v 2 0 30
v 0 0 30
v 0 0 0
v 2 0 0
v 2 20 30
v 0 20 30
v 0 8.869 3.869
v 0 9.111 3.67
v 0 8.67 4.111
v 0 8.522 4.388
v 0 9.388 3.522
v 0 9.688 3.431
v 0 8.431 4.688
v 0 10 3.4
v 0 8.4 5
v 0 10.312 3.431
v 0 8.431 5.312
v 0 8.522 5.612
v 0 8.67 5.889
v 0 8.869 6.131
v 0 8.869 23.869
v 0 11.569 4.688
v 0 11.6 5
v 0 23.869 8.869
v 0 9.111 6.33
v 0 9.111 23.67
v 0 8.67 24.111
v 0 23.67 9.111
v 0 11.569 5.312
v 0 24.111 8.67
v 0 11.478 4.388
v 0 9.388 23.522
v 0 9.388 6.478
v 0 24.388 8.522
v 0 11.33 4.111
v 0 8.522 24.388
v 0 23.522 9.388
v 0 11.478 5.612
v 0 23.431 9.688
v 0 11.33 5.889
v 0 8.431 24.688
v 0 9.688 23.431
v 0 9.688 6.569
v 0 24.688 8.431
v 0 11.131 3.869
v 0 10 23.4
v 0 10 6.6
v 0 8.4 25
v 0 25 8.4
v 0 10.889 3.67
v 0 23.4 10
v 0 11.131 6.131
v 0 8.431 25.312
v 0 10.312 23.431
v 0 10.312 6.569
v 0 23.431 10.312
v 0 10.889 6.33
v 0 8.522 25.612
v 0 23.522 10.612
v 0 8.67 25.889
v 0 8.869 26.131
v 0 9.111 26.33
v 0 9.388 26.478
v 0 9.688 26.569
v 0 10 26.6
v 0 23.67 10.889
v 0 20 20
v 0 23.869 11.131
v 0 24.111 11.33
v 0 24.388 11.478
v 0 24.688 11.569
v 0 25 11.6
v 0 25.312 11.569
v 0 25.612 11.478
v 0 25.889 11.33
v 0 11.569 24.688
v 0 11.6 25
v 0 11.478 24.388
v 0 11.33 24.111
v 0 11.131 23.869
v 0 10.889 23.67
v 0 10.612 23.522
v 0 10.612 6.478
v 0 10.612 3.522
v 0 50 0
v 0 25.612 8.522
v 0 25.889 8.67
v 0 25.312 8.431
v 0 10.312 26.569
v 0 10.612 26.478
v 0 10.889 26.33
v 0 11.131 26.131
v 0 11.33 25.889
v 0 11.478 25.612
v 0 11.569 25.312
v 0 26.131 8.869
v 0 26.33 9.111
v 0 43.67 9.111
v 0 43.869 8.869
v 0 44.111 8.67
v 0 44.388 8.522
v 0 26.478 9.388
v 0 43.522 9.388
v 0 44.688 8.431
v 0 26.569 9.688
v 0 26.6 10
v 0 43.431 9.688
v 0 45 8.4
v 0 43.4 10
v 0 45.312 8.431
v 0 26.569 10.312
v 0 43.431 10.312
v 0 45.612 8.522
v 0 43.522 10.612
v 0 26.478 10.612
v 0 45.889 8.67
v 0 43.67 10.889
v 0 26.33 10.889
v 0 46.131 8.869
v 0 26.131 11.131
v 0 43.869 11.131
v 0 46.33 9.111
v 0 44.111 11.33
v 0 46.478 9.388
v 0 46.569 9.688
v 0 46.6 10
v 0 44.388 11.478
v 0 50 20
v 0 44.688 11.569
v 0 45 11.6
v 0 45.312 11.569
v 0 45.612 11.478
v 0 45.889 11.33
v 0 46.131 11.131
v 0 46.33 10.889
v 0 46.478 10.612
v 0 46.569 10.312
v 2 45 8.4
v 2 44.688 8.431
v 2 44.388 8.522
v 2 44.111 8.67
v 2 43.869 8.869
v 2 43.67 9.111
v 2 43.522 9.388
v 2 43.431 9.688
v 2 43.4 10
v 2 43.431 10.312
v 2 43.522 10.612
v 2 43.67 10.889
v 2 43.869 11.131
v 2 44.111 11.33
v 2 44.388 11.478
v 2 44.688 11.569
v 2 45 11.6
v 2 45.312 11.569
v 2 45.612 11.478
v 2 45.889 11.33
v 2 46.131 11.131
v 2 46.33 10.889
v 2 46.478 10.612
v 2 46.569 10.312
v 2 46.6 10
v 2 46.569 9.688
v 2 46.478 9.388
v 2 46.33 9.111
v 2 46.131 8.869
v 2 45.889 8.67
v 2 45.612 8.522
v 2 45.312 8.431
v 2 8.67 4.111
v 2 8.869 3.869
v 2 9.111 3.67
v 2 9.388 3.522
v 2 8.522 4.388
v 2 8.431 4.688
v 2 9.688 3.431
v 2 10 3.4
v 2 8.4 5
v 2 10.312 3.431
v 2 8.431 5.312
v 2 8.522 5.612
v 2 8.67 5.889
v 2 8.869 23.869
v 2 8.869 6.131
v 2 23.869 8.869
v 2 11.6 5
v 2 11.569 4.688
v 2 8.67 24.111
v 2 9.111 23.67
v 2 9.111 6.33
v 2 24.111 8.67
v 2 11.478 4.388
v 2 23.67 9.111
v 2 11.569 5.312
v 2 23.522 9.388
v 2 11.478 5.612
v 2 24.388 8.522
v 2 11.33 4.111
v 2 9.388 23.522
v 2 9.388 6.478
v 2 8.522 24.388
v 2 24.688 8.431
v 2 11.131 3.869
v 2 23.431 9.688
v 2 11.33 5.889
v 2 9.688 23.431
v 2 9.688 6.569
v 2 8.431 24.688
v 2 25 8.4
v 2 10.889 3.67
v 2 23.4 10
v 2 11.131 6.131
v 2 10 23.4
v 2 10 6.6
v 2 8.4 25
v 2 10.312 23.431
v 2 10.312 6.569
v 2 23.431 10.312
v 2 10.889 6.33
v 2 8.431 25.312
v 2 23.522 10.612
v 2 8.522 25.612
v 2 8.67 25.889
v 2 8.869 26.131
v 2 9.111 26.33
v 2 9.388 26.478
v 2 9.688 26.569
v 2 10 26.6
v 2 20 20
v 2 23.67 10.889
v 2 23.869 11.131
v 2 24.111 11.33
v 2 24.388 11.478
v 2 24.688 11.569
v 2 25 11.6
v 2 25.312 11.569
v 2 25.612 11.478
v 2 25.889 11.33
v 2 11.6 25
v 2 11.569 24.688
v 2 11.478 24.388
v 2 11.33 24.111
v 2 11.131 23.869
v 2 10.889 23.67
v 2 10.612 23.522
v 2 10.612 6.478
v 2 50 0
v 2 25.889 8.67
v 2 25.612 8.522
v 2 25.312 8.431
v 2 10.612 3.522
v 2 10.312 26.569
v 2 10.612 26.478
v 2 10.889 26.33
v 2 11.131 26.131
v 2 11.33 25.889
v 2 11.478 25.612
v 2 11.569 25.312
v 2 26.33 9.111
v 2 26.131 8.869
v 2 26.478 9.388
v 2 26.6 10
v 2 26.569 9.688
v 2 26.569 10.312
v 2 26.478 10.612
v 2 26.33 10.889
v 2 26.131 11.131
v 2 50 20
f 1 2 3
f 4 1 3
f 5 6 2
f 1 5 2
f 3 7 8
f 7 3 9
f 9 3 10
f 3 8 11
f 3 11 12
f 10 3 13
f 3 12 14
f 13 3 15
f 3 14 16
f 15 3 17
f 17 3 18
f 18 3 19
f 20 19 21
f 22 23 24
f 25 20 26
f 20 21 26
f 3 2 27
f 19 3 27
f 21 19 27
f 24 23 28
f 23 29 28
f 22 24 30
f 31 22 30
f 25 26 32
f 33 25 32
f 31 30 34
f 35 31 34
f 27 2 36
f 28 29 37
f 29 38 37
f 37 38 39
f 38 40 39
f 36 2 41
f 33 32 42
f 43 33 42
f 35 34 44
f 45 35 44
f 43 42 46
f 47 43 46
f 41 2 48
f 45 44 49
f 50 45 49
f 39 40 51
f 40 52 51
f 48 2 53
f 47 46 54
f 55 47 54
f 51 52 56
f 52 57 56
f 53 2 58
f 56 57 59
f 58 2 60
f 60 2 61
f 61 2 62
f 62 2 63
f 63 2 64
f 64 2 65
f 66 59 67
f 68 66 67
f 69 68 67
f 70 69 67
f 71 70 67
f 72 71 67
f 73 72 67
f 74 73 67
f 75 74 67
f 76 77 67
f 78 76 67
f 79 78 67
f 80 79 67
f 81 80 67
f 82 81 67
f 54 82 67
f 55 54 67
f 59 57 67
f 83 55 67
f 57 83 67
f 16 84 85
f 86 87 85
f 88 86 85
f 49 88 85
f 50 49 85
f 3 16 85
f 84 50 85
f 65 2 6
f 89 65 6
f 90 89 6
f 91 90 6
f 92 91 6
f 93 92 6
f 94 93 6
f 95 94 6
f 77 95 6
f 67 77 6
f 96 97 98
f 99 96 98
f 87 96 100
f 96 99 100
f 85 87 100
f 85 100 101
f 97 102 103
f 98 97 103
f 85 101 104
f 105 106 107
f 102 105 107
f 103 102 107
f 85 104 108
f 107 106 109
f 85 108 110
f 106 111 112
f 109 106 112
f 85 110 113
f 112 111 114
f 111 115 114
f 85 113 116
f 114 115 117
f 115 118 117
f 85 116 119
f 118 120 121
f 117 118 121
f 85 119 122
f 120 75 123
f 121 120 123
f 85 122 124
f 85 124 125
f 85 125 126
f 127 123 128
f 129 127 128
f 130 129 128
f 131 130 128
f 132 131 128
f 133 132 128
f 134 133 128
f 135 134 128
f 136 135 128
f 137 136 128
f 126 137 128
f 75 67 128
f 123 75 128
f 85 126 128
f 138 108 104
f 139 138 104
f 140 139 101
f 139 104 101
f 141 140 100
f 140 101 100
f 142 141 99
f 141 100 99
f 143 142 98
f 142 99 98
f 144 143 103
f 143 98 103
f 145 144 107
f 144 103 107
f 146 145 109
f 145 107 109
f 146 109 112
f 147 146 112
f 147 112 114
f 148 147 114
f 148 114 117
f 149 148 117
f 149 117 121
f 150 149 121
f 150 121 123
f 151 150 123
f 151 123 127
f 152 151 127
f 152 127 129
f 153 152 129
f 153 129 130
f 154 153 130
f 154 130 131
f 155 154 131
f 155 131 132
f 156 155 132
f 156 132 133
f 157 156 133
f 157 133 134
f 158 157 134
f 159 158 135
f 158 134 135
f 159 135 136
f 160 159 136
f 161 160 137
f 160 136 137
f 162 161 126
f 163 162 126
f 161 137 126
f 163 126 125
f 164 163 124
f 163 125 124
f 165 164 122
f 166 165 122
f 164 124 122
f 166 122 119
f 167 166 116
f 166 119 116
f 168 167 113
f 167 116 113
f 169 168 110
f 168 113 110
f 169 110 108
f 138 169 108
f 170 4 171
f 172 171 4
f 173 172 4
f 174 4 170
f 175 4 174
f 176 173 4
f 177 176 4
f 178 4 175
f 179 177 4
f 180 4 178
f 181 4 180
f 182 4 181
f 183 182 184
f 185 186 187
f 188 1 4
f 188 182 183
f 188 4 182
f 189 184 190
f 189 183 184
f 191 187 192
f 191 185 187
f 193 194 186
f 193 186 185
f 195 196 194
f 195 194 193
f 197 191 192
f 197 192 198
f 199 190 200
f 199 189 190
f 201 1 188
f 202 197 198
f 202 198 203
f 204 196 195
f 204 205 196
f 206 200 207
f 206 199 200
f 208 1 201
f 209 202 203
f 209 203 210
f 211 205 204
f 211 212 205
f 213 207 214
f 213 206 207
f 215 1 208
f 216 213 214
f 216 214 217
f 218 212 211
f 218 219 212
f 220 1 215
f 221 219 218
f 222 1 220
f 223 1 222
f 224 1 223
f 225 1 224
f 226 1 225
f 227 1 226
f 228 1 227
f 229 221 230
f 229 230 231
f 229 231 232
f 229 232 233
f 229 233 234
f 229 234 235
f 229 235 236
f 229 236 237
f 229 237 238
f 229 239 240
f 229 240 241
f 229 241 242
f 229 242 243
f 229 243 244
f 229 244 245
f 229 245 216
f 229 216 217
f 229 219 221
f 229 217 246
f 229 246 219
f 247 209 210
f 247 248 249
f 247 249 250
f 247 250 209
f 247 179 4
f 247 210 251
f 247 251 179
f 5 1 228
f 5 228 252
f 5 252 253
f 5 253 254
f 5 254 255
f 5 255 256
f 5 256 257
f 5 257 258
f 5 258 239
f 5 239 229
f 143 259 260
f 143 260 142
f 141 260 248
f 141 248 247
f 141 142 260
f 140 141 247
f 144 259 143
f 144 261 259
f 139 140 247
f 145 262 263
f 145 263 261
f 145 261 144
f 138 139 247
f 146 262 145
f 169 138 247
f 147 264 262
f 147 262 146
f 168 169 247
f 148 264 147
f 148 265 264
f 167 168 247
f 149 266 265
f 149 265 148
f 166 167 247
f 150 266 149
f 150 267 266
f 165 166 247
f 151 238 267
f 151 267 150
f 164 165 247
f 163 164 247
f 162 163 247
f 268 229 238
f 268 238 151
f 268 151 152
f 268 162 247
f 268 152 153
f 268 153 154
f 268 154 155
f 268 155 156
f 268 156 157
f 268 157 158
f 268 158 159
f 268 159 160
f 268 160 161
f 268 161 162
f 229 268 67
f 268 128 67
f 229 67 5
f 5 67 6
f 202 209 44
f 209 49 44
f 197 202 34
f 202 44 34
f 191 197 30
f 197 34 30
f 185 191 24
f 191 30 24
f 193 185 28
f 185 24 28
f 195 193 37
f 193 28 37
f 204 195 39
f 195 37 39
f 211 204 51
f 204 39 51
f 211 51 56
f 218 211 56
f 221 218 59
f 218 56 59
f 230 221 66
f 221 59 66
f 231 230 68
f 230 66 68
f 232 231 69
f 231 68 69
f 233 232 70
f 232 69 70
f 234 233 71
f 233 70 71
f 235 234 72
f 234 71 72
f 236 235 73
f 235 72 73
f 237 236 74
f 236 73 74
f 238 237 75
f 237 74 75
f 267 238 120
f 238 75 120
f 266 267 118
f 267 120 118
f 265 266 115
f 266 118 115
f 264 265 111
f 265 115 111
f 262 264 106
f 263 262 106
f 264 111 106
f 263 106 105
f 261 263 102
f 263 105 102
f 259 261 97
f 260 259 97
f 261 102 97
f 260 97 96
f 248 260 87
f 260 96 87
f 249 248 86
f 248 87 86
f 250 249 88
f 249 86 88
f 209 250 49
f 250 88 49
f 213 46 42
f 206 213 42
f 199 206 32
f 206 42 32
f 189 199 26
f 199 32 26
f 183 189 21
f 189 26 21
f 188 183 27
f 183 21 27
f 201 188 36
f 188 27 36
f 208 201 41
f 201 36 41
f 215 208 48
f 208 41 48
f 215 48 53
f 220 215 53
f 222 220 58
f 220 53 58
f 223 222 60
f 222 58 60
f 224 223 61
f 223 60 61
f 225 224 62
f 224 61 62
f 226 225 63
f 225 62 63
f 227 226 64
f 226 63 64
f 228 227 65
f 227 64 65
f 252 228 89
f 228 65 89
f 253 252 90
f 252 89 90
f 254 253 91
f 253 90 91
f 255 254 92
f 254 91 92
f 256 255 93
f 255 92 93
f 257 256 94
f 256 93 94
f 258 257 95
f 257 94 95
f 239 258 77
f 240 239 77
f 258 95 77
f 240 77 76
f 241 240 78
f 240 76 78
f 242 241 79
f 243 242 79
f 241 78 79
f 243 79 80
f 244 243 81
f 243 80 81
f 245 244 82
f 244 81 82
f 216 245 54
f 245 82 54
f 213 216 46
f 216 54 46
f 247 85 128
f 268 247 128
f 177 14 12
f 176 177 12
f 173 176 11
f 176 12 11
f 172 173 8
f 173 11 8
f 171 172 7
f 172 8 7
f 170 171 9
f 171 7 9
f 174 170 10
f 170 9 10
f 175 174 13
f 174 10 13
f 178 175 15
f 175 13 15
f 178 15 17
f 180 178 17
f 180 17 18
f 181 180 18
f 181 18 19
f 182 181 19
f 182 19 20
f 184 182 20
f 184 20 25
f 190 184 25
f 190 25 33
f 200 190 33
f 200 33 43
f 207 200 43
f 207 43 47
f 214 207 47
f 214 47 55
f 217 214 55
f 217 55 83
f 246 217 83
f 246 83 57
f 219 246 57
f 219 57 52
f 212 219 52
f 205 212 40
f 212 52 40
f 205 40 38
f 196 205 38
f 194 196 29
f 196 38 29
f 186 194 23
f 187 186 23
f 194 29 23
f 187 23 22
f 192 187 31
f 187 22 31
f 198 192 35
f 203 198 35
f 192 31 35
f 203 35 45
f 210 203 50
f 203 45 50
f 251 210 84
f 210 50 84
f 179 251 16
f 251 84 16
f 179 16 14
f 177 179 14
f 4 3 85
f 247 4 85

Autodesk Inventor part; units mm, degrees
ref_plane "YZ Plane" through (0, 0, 0) normal (1, 0, 0) x (0, 1, 0)
ref_plane "XZ Plane" through (0, 0, 0) normal (0, 1, 0) x (-1, 0, 0)
ref_plane "XY Plane" through (0, 0, 0) normal (0, 0, 1) x (1, 0, 0)
sketch "スケッチ1" plane through (0, 0, 0) normal (1, 0, 0) x (0, 1, 0)
  line L0 (0, 0) -> (50, 0)
  line L1 (50, 0) -> (50, 20)
  line L2 (50, 20) -> (0, 20)
  line L3 (0, 20) -> (0, 0)
  line L4 (0, 0) -> (20, 0)
  line L5 (20, 0) -> (20, 30)
  line L6 (20, 30) -> (0, 30)
  line L7 (0, 30) -> (0, 0)
  point P0 (0, 20)
  point P1 (20, 20)
  point P2 (20, 0)
  point P3 (20, 0)
  dimension "d0" = 20
  dimension "d1" = 20
  dimension "d2" = 30
  dimension "d3" = 30
extrude "押し出し1" add sketch "スケッチ1" along normal blind 2
sketch "スケッチ2" plane through (2, 0, 0) normal (1, 0, 0) x (0, 0, -1)
  line L0 (-30, 20) -> (-30, 0) projected
  line L1 (-30, 10) -> (0, 10) construction
  line L2 (0, 0) -> (0, 50) projected
  line L3 (0, 50) -> (-20, 50) projected
  line L4 (-10, 50) -> (-10, 0) construction
  line L5 (-30, 0) -> (0, 0) projected
  point P0 (-25, 10)
  point P1 (-5, 10)
  point P2 (-10, 25)
  point P3 (-10, 45)
  dimension "d6" = 20
  dimension "d7" = 5
  dimension "d8" = 20
  dimension "d9" = 5
hole "穴1" at (2, 10, 25) at (2, 10, 5) at (2, 25, 10) at (2, 45, 10) direction (-1, 0, 0) diameter 3.2 end through all
properties part number "FrameJointL2020" material "アルミニウム 6061"
